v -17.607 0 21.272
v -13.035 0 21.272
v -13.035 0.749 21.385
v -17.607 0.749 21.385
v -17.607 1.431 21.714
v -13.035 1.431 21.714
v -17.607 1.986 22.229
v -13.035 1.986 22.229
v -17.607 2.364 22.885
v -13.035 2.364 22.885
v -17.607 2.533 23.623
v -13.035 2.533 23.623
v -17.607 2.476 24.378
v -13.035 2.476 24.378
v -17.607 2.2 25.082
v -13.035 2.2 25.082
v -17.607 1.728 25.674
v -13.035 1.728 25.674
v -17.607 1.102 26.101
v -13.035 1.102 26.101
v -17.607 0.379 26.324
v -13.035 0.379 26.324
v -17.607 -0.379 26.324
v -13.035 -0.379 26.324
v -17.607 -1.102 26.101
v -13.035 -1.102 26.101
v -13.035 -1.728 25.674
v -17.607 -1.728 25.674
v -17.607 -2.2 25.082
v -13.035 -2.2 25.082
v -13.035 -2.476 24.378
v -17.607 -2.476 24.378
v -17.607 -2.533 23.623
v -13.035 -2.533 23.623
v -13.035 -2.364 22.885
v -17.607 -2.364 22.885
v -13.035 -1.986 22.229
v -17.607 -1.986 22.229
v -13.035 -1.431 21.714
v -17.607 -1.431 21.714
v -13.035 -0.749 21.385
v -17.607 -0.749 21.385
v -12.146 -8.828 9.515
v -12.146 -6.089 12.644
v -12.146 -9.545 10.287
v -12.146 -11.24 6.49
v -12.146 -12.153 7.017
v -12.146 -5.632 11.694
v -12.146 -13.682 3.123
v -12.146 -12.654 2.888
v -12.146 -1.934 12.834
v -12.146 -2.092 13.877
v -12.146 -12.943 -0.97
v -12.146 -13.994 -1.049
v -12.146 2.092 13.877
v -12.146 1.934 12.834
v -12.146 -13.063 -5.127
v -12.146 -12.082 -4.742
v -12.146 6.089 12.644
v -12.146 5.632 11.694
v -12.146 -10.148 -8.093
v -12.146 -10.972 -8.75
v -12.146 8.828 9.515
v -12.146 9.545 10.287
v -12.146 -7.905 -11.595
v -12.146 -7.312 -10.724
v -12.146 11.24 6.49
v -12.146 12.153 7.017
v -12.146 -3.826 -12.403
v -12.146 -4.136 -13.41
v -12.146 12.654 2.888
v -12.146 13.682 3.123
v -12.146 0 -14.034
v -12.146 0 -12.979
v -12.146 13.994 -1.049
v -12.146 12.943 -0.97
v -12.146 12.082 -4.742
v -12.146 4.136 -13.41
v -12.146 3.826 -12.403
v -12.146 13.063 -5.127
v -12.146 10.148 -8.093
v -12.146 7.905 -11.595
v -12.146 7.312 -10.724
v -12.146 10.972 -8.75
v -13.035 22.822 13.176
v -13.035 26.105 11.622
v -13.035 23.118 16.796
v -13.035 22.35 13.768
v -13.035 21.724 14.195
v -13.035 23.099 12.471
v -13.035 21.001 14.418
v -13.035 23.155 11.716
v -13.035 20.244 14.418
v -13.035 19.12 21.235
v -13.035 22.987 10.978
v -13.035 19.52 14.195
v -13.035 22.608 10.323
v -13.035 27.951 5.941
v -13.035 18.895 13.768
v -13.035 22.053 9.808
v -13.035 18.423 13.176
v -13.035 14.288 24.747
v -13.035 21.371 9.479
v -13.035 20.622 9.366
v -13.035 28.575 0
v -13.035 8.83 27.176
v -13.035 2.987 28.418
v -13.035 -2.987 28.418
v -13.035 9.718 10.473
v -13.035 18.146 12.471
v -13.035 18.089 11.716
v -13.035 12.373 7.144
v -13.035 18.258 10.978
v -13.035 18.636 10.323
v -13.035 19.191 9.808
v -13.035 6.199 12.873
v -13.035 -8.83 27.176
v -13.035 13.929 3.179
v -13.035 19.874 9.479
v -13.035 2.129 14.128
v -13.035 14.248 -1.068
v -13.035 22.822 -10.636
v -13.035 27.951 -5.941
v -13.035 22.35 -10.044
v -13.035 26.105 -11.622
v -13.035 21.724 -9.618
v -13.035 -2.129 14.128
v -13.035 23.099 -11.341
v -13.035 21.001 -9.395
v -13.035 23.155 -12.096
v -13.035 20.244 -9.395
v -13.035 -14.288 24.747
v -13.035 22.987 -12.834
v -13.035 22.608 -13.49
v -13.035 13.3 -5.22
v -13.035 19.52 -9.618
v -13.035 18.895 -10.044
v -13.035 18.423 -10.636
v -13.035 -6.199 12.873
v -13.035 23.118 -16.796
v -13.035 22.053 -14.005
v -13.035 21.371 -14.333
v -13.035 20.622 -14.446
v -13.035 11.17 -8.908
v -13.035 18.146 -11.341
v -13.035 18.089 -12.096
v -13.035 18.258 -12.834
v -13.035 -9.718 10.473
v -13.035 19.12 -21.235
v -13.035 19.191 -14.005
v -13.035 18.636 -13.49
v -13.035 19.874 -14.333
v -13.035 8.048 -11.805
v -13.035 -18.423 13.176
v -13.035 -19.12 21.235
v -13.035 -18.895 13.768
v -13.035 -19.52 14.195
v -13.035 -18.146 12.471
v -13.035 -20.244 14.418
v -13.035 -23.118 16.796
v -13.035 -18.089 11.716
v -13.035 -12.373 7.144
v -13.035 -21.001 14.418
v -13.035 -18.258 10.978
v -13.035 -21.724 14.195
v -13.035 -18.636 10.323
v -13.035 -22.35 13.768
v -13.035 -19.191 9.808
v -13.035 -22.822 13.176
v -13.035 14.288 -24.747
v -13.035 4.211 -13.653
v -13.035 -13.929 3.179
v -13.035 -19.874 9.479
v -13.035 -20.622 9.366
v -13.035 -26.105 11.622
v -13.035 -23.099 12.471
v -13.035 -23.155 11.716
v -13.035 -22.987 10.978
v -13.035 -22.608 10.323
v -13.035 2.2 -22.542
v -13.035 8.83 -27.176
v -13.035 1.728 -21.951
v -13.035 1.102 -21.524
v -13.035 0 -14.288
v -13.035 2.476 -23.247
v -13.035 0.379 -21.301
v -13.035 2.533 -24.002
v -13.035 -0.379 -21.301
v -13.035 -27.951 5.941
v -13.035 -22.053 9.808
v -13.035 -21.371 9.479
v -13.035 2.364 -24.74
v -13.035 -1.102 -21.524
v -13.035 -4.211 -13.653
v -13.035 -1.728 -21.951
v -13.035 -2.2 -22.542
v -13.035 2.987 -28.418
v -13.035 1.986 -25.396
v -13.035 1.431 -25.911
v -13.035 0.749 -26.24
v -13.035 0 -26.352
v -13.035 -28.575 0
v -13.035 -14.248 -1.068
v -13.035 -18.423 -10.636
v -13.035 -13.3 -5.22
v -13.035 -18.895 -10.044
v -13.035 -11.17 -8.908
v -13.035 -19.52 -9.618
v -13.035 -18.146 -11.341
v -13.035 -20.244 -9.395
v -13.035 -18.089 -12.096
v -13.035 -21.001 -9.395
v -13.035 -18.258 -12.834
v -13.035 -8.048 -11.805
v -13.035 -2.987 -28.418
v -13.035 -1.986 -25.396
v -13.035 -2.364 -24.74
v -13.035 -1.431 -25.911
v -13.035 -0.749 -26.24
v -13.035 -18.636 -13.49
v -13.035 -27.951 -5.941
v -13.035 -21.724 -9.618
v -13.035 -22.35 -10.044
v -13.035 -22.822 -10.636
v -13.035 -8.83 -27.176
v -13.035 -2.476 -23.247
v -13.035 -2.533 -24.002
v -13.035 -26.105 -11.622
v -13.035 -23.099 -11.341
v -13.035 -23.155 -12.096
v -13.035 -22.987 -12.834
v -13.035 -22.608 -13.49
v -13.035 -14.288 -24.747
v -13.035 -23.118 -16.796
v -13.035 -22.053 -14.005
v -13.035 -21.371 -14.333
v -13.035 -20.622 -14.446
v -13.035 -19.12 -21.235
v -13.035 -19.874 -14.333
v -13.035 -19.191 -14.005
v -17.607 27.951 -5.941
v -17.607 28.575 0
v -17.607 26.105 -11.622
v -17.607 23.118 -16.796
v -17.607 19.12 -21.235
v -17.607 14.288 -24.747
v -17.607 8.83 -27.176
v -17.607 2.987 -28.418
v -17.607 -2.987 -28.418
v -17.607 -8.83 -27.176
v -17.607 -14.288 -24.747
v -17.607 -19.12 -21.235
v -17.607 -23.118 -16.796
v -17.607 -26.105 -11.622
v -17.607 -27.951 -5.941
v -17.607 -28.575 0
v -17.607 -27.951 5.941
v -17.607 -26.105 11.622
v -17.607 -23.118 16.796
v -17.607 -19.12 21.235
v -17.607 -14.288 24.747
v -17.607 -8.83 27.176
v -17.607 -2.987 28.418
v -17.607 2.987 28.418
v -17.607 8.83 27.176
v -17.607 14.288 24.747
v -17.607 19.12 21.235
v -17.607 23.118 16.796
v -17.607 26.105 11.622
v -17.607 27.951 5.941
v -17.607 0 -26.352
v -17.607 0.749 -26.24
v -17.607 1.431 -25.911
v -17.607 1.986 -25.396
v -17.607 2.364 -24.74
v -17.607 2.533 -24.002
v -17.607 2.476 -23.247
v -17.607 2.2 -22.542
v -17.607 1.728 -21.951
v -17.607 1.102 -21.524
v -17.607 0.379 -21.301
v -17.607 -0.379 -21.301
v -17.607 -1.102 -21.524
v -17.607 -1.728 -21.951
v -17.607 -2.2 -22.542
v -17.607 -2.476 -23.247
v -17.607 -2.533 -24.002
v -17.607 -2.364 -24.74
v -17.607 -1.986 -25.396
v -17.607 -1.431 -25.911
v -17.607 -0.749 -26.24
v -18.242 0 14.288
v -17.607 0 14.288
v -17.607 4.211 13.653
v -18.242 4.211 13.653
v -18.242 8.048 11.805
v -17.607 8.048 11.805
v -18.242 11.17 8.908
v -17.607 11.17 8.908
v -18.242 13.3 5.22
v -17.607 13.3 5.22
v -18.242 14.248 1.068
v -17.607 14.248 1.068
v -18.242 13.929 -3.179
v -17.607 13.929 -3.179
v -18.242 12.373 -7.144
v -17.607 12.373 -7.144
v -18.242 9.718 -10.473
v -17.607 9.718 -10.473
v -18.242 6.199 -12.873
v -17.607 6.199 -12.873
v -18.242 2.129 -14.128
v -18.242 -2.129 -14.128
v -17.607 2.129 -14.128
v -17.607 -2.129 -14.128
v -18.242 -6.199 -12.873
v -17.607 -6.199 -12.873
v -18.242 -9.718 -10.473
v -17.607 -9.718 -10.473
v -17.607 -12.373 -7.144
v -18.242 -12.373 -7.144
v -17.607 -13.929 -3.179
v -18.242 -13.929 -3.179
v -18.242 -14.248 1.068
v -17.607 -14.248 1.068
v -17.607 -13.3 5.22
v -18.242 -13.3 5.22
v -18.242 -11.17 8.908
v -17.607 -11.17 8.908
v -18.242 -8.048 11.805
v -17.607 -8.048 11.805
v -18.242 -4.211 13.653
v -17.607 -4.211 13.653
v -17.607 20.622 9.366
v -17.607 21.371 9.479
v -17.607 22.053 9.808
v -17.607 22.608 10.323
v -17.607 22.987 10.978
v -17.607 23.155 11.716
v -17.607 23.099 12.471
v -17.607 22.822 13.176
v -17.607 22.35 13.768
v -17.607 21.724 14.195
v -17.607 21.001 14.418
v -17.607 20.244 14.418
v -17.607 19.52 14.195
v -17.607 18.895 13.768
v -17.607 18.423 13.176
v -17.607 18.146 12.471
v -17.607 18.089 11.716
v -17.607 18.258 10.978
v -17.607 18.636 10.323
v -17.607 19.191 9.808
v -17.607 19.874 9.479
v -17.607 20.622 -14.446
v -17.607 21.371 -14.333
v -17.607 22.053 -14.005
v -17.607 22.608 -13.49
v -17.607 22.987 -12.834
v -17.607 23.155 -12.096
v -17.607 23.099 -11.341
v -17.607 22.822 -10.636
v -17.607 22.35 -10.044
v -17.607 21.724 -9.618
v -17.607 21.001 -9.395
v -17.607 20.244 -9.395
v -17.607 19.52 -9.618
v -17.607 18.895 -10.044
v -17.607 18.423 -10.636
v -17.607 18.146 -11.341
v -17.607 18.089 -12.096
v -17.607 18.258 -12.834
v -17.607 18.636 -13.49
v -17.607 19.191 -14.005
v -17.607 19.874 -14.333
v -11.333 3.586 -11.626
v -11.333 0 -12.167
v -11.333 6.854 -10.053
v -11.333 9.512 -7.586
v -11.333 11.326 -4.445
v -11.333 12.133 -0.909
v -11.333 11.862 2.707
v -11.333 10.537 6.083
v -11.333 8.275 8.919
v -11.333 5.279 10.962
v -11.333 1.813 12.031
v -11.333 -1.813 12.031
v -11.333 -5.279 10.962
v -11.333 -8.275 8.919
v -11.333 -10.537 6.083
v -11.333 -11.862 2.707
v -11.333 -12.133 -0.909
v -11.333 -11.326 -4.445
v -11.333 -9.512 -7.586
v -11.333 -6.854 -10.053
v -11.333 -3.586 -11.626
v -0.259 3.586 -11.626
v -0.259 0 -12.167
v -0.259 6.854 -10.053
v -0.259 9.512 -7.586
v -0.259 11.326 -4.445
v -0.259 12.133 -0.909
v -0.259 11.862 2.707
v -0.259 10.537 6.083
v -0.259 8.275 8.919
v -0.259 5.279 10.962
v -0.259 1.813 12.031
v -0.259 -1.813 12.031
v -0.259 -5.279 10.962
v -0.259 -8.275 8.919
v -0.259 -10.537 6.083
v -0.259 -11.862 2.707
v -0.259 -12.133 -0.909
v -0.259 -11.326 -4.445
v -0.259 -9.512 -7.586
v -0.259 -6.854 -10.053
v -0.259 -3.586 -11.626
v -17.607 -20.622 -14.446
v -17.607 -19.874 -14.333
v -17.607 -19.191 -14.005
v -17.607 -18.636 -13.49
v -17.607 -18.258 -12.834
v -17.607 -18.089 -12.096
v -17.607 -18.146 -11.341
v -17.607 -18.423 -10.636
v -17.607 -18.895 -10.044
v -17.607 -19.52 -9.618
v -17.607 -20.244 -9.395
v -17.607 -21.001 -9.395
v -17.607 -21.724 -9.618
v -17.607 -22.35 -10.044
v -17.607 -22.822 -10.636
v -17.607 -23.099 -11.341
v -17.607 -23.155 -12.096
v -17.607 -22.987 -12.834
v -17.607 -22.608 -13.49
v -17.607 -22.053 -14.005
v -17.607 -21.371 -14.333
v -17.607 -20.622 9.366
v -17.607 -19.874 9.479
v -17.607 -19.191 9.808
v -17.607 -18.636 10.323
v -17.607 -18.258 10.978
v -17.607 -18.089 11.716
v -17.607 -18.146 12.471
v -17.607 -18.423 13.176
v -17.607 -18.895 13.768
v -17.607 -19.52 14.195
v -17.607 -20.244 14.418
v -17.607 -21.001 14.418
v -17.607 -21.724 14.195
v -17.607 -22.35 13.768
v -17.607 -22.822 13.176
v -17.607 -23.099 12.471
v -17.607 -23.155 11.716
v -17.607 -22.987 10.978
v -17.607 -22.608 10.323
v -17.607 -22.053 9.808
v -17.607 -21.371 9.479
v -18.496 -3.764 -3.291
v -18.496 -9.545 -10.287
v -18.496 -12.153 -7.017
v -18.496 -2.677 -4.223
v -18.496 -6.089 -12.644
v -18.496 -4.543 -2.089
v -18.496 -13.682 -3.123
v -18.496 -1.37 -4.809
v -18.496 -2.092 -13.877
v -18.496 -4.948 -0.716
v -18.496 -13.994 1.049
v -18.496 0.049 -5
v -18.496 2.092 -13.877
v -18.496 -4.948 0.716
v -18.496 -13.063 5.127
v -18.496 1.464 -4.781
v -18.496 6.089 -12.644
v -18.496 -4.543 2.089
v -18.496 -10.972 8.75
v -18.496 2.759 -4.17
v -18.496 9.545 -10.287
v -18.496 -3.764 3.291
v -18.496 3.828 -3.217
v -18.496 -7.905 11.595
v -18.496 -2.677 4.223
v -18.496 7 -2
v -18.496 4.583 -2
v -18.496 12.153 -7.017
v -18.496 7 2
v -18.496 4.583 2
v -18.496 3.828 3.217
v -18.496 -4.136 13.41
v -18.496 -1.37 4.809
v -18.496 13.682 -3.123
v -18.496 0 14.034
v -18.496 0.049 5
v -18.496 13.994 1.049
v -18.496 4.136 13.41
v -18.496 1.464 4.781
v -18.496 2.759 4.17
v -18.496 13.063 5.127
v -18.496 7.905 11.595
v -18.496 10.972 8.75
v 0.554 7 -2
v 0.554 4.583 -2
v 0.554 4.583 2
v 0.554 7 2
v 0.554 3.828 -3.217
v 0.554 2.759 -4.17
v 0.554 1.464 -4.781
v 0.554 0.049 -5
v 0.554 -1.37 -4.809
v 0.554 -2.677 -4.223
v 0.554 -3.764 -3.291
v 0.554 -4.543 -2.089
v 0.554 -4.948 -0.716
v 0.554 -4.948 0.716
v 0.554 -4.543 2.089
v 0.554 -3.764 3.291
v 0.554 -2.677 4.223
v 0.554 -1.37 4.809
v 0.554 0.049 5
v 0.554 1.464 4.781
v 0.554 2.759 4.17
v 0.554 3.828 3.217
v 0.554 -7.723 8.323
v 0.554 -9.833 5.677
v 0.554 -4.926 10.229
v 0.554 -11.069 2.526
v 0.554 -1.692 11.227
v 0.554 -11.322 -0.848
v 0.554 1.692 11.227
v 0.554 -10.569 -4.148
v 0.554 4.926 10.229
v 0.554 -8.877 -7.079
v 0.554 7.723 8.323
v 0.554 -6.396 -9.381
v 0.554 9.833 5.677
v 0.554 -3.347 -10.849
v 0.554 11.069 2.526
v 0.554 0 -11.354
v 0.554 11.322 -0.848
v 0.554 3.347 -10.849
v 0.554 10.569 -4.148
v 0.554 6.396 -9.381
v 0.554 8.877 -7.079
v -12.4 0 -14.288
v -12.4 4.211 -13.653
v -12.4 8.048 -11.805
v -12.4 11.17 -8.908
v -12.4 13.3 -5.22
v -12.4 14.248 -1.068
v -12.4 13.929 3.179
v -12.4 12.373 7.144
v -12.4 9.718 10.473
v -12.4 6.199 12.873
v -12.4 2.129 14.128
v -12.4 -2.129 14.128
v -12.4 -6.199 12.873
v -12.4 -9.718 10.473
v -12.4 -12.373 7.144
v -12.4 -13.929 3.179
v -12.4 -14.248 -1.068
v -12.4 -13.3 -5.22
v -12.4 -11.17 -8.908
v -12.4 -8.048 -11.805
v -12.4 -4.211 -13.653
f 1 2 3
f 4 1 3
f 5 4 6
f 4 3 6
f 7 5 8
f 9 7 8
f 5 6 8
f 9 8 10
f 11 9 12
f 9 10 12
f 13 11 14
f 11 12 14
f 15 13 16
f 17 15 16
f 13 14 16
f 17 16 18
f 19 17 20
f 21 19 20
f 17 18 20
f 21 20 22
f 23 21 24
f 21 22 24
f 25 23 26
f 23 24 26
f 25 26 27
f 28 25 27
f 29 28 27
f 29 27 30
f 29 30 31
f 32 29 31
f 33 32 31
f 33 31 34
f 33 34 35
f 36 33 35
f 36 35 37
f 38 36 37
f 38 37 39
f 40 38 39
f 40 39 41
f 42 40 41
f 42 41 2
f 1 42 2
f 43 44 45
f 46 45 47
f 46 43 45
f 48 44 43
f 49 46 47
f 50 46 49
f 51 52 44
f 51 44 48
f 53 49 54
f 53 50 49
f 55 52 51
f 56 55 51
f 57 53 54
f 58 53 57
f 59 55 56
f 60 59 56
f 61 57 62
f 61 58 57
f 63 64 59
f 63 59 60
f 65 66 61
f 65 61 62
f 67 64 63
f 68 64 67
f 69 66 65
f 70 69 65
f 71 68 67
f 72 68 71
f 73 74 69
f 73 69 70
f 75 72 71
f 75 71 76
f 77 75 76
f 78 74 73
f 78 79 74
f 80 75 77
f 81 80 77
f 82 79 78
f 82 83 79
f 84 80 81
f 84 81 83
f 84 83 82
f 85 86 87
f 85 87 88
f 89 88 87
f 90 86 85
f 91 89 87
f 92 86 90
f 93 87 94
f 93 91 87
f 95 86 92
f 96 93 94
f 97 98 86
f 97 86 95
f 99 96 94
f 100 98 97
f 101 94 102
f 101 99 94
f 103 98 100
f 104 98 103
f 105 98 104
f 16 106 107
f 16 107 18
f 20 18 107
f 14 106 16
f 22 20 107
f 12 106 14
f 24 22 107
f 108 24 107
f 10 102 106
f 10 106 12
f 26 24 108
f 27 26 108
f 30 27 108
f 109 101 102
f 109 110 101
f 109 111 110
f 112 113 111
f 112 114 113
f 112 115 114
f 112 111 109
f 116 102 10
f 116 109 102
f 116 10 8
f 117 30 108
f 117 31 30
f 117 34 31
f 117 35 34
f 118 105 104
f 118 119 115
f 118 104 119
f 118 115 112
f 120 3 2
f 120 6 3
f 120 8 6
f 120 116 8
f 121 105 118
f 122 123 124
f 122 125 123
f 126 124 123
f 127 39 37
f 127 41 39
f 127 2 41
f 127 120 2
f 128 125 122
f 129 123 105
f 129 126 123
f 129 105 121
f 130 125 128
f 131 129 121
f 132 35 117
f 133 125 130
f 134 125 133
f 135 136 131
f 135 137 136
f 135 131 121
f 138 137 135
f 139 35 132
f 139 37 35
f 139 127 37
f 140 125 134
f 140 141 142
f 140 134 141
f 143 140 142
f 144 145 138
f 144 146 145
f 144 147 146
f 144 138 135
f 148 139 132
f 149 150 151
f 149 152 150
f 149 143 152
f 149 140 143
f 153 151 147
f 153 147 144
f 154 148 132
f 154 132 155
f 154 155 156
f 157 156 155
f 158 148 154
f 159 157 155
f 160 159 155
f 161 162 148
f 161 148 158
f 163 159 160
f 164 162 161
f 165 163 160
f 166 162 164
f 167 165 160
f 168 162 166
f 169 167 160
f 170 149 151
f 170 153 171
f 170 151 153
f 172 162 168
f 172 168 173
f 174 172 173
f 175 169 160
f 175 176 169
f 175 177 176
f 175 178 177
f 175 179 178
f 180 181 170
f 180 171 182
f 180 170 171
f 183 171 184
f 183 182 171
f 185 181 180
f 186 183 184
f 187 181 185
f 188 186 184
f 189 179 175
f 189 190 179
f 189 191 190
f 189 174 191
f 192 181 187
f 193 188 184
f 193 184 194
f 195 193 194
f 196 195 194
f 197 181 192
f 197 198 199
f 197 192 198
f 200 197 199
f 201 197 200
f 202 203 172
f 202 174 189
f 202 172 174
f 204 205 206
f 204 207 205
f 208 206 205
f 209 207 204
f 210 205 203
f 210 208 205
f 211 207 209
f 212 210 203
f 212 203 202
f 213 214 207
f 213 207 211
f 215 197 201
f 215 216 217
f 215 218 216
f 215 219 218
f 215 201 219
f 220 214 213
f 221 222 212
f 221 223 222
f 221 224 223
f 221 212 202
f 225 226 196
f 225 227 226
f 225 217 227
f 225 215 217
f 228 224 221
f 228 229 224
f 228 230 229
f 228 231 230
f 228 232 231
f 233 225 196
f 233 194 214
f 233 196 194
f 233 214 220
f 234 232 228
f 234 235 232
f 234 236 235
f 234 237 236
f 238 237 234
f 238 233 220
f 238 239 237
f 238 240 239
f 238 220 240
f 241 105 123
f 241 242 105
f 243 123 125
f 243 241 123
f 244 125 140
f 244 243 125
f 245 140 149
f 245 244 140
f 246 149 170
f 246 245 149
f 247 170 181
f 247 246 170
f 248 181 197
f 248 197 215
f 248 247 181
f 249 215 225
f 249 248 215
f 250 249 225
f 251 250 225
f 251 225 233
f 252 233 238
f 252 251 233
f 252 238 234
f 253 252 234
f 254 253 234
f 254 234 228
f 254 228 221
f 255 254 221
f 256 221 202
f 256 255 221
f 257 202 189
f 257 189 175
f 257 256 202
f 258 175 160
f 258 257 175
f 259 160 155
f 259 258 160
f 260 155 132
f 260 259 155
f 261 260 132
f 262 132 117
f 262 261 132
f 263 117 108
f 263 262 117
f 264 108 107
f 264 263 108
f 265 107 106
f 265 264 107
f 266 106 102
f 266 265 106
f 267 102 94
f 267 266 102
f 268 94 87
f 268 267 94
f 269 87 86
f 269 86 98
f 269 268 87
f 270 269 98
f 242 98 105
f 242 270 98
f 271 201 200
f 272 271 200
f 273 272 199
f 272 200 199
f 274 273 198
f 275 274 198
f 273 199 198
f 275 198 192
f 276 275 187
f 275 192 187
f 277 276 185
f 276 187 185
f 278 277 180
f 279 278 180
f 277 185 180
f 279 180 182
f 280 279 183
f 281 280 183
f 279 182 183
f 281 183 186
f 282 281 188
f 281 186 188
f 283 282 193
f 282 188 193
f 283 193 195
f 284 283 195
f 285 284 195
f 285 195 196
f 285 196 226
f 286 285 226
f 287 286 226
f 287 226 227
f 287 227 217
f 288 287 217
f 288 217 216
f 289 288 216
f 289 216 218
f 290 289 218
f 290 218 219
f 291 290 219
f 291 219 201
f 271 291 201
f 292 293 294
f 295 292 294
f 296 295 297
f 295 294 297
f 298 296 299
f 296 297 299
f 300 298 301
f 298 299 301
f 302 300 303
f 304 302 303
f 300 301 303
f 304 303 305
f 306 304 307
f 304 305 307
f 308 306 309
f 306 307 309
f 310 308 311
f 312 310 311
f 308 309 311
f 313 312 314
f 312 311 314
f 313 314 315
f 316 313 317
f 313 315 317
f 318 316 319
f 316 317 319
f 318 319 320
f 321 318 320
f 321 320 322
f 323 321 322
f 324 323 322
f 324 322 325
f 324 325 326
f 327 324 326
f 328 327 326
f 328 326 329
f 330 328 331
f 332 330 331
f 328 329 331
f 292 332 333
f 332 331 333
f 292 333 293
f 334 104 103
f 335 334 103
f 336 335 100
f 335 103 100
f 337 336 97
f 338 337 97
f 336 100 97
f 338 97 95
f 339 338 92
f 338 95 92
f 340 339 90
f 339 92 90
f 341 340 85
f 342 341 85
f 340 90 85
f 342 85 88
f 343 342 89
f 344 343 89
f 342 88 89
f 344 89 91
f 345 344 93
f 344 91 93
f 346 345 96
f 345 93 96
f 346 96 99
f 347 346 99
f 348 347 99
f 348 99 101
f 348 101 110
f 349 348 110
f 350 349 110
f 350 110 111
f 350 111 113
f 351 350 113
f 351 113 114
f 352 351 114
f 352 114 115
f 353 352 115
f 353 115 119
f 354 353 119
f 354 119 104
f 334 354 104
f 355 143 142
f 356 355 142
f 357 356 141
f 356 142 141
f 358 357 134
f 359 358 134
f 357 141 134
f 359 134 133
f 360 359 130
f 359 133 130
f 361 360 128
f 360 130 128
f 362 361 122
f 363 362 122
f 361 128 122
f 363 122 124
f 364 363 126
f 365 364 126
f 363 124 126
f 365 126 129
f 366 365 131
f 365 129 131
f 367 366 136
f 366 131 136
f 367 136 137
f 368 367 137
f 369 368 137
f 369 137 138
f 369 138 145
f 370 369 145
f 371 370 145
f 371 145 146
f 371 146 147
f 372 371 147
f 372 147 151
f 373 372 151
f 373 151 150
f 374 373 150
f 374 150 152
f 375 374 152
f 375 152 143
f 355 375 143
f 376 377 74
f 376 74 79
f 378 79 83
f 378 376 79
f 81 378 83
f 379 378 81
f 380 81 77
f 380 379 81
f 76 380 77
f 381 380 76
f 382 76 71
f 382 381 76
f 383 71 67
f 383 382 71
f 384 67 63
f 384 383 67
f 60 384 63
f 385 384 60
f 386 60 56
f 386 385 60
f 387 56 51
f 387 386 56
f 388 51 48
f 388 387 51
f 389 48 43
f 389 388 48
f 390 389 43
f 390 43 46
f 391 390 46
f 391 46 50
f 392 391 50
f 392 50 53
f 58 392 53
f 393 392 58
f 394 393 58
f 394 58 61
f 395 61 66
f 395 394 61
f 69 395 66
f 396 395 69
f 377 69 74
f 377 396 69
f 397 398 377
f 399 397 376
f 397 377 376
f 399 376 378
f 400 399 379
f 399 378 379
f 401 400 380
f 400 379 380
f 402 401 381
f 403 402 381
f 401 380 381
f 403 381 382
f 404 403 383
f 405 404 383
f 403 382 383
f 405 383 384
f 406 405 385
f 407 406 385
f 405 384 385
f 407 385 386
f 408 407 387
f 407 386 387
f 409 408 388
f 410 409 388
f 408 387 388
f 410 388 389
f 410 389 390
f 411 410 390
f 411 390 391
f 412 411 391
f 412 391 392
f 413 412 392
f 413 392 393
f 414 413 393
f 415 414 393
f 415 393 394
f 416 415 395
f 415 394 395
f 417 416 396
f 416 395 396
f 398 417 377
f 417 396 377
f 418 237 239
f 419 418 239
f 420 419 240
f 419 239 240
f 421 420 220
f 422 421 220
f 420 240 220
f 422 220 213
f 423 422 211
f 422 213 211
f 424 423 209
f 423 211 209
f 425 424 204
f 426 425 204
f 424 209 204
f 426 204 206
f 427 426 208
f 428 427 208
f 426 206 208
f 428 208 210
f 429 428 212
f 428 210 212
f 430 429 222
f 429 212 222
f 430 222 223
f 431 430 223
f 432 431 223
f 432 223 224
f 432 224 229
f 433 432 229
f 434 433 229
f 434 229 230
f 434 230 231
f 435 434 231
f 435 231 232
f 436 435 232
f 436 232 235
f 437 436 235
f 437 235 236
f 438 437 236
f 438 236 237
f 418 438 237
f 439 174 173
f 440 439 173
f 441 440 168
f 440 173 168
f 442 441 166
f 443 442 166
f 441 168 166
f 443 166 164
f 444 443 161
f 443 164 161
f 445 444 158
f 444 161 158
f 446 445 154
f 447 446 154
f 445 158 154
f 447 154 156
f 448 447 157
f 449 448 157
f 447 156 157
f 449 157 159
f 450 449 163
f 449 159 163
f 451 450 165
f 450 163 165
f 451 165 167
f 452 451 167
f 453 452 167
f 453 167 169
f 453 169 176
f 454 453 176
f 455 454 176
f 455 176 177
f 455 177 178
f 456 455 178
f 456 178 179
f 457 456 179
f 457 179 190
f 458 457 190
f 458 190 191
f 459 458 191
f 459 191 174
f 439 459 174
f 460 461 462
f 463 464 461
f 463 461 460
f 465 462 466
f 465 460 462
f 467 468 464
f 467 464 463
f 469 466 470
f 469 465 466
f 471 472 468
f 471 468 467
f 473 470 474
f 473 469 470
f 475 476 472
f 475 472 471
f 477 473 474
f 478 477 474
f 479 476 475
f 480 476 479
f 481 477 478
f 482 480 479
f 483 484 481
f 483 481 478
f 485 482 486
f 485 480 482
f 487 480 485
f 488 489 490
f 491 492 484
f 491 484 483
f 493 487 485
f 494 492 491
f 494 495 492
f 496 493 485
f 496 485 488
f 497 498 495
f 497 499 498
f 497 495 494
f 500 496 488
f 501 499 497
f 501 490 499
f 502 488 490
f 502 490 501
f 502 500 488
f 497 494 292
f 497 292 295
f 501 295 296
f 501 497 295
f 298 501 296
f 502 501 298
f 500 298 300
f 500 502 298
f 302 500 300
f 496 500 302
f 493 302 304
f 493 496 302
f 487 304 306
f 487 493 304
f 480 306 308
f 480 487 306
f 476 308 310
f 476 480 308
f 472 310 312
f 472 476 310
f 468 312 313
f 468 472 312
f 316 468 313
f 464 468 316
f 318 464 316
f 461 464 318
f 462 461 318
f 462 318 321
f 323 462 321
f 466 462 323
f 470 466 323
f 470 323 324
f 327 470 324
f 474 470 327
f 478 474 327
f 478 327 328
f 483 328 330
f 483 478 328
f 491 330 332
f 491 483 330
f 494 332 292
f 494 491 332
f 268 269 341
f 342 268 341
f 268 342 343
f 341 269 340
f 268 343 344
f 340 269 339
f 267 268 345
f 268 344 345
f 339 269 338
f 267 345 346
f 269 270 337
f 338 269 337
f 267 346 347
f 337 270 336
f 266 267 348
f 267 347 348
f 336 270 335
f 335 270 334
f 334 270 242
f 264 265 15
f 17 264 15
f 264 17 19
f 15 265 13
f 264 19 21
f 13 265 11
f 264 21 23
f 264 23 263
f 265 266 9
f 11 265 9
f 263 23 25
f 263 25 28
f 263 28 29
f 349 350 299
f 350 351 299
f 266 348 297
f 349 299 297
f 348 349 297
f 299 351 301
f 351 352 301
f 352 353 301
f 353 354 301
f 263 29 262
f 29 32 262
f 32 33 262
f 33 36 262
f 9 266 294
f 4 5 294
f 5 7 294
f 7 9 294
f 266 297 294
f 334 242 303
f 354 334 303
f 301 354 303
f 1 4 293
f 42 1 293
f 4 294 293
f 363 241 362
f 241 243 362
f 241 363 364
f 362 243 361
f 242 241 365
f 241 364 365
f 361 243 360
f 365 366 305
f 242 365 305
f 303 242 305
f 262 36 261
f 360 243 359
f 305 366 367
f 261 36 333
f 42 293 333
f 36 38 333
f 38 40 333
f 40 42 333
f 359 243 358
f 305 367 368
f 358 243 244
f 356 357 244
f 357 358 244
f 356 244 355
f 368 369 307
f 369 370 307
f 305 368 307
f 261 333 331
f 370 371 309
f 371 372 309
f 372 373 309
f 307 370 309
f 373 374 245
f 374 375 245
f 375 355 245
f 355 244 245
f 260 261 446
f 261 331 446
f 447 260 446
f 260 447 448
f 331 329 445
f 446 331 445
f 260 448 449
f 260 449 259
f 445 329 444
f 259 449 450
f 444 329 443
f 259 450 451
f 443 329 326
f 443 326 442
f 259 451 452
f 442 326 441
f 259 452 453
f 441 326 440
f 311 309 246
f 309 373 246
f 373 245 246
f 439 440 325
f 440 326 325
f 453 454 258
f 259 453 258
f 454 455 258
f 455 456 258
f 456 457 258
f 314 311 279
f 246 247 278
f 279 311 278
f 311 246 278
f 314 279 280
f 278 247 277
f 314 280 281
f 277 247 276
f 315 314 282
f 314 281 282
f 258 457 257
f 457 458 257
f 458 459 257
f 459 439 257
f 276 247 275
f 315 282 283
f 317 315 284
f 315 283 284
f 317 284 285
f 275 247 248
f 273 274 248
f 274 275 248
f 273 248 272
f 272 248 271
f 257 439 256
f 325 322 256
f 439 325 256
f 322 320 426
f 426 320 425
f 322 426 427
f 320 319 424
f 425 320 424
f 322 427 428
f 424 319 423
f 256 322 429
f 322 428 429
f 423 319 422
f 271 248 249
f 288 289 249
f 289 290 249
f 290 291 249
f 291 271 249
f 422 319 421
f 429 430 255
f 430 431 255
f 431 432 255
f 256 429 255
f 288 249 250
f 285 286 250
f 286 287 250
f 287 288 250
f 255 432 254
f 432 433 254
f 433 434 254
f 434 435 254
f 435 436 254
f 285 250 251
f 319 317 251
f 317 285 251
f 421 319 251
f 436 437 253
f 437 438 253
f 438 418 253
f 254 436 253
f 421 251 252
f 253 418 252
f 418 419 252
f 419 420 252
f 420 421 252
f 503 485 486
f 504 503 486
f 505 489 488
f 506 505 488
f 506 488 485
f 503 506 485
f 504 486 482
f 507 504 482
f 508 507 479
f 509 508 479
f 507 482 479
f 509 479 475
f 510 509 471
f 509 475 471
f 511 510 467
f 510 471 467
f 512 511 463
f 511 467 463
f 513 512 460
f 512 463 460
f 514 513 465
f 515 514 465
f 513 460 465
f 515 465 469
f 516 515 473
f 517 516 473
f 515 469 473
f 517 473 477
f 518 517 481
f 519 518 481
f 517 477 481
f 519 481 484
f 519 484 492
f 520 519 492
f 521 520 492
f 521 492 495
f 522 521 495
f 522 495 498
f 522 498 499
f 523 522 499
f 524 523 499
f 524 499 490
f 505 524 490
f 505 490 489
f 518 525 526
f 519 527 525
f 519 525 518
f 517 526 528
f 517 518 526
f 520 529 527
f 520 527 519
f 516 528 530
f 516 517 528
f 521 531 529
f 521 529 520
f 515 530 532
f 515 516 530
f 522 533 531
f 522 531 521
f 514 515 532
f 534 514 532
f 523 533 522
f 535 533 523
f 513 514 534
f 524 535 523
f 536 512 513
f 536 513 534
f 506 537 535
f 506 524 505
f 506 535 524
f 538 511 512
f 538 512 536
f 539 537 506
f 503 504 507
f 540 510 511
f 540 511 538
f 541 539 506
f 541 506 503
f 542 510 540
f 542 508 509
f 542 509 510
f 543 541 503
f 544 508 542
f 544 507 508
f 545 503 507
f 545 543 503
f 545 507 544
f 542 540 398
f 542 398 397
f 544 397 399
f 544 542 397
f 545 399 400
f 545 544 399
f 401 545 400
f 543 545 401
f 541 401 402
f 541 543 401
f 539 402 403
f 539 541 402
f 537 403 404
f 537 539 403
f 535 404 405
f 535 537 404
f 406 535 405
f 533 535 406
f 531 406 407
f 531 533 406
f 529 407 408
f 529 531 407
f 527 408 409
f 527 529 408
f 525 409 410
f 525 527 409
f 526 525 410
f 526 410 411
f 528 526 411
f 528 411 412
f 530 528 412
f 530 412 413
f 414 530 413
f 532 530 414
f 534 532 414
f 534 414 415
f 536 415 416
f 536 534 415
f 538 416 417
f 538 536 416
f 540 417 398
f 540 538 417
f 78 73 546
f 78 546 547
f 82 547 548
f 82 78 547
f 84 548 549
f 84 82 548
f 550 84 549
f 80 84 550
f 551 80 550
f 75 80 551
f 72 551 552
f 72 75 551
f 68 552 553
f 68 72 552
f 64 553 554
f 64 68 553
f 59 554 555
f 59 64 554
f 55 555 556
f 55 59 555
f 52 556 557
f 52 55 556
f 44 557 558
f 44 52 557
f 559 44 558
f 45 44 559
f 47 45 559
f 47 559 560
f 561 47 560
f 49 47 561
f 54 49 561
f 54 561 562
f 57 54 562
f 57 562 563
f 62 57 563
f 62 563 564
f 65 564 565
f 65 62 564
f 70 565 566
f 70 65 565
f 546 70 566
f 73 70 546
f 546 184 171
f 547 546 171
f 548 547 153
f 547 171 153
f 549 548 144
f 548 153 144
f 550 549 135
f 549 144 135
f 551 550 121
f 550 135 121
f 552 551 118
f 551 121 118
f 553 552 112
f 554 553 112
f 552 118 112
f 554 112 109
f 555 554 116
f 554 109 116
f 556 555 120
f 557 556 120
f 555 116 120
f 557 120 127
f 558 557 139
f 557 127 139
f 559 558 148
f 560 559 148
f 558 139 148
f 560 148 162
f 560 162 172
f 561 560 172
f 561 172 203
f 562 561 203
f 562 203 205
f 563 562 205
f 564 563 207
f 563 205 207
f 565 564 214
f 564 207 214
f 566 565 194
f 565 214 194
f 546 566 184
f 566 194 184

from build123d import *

# Parameters (mm, degrees)
SKETCH1_W                  = 4.572
SKETCH1_H                  = 28.575
SKETCH2_R                  = 14.2875
BOSS_EXTRUDE1_DEPTH        = 0.889
SKETCH3_R                  = 12.1666
BOSS_EXTRUDE2_DEPTH        = 12.7
SKETCH4_R                  = 14.2875
BOSS_EXTRUDE3_DEPTH        = 0.889
CUT_EXTRUDE1_DEPTH         = 20.05
SKETCH6_W                  = 19.05
SKETCH6_H                  = 5
F_10_CLEARANCE_HOLE1_D     = 5.08
F_10_CLEARANCE_HOLE1_DEPTH = 18.161
CHAMFER1_SIZE              = 0.254
CHAMFER2_SIZE              = 0.8128


with BuildPart() as part:
    # Sketch1 → Revolve1 (revolve)
    with BuildSketch(Plane(origin=(0, 0, 0), x_dir=(-1, 0, 0), z_dir=(0, 0, -1))):
        with Locations((15.321066246, 14.2875)):
            Rectangle(SKETCH1_W, SKETCH1_H)
    revolve(axis=Axis((-13.035066246, 0, 0), (-1, 0, 0)))

    # Sketch2 → Boss-Extrude1 (add)
    with BuildSketch(Plane(origin=(-13.035066246, 0, 0), x_dir=(0, 0, -1), z_dir=(1, 0, 0))):
        Circle(SKETCH2_R)
    extrude(amount=BOSS_EXTRUDE1_DEPTH)

    # Sketch3 → Boss-Extrude2 (add)
    with BuildSketch(Plane(origin=(-12.146066246, 0, 0), x_dir=(0, 0, -1), z_dir=(1, 0, 0))):
        Circle(SKETCH3_R)
    extrude(amount=BOSS_EXTRUDE2_DEPTH)

    # Sketch4 → Boss-Extrude3 (add)
    with BuildSketch(Plane.ZY.offset(17.607066246)):
        Circle(SKETCH4_R)
    extrude(amount=BOSS_EXTRUDE3_DEPTH)

    # Sketch5 → Cut-Extrude1 (cut, through all)
    with BuildSketch(Plane.ZY.offset(18.496066246)):
        with BuildLine():
            Line((2, 4.582575695), (2, 7))
            Line((2, 7), (-2, 7))
            Line((-2, 7), (-2, 4.582575695))
            ThreePointArc((-2, 4.582575695), (0, 5), (2, 4.582575695))
        make_face()
    extrude(amount=-CUT_EXTRUDE1_DEPTH, mode=Mode.SUBTRACT)

    # Sketch6 → Cut-Revolve1 (revolve, cut)
    with BuildSketch(Plane(origin=(0, 0, 0), x_dir=(-1, 0, 0), z_dir=(0, 0, -1))):
        with Locations((8.971066246, 2.5)):
            Rectangle(SKETCH6_W, SKETCH6_H)
    revolve(axis=Axis((0.553933754, 0, 0), (-1, 0, 0)), mode=Mode.SUBTRACT)

    # #10 Clearance Hole1
    with Locations(Plane.ZY.offset(17.607066246)):
        with Locations((11.90625, 20.622229928), (-11.90625, 20.622229928), (-23.8125, 0), (-11.90625, -20.622229928), (11.90625, -20.622229928), (23.8125, 0)):
            Hole(F_10_CLEARANCE_HOLE1_D / 2, depth=F_10_CLEARANCE_HOLE1_DEPTH)

    # Chamfer1
    chamfer1_edges = [part.edges().sort_by_distance(p)[0] for p in [
        (-18.496066246, 0, -14.2875),
        (-12.146066246, 0, 14.2875),
    ]]
    chamfer(chamfer1_edges, length=CHAMFER1_SIZE)

    # Chamfer2
    chamfer2_edges = [part.edges().sort_by_distance(p)[0] for p in [
        (-12.146066246, 0, 12.1666),
        (0.553933754, 0, 12.1666),
    ]]
    chamfer(chamfer2_edges, length=CHAMFER2_SIZE)


solid = part.part
